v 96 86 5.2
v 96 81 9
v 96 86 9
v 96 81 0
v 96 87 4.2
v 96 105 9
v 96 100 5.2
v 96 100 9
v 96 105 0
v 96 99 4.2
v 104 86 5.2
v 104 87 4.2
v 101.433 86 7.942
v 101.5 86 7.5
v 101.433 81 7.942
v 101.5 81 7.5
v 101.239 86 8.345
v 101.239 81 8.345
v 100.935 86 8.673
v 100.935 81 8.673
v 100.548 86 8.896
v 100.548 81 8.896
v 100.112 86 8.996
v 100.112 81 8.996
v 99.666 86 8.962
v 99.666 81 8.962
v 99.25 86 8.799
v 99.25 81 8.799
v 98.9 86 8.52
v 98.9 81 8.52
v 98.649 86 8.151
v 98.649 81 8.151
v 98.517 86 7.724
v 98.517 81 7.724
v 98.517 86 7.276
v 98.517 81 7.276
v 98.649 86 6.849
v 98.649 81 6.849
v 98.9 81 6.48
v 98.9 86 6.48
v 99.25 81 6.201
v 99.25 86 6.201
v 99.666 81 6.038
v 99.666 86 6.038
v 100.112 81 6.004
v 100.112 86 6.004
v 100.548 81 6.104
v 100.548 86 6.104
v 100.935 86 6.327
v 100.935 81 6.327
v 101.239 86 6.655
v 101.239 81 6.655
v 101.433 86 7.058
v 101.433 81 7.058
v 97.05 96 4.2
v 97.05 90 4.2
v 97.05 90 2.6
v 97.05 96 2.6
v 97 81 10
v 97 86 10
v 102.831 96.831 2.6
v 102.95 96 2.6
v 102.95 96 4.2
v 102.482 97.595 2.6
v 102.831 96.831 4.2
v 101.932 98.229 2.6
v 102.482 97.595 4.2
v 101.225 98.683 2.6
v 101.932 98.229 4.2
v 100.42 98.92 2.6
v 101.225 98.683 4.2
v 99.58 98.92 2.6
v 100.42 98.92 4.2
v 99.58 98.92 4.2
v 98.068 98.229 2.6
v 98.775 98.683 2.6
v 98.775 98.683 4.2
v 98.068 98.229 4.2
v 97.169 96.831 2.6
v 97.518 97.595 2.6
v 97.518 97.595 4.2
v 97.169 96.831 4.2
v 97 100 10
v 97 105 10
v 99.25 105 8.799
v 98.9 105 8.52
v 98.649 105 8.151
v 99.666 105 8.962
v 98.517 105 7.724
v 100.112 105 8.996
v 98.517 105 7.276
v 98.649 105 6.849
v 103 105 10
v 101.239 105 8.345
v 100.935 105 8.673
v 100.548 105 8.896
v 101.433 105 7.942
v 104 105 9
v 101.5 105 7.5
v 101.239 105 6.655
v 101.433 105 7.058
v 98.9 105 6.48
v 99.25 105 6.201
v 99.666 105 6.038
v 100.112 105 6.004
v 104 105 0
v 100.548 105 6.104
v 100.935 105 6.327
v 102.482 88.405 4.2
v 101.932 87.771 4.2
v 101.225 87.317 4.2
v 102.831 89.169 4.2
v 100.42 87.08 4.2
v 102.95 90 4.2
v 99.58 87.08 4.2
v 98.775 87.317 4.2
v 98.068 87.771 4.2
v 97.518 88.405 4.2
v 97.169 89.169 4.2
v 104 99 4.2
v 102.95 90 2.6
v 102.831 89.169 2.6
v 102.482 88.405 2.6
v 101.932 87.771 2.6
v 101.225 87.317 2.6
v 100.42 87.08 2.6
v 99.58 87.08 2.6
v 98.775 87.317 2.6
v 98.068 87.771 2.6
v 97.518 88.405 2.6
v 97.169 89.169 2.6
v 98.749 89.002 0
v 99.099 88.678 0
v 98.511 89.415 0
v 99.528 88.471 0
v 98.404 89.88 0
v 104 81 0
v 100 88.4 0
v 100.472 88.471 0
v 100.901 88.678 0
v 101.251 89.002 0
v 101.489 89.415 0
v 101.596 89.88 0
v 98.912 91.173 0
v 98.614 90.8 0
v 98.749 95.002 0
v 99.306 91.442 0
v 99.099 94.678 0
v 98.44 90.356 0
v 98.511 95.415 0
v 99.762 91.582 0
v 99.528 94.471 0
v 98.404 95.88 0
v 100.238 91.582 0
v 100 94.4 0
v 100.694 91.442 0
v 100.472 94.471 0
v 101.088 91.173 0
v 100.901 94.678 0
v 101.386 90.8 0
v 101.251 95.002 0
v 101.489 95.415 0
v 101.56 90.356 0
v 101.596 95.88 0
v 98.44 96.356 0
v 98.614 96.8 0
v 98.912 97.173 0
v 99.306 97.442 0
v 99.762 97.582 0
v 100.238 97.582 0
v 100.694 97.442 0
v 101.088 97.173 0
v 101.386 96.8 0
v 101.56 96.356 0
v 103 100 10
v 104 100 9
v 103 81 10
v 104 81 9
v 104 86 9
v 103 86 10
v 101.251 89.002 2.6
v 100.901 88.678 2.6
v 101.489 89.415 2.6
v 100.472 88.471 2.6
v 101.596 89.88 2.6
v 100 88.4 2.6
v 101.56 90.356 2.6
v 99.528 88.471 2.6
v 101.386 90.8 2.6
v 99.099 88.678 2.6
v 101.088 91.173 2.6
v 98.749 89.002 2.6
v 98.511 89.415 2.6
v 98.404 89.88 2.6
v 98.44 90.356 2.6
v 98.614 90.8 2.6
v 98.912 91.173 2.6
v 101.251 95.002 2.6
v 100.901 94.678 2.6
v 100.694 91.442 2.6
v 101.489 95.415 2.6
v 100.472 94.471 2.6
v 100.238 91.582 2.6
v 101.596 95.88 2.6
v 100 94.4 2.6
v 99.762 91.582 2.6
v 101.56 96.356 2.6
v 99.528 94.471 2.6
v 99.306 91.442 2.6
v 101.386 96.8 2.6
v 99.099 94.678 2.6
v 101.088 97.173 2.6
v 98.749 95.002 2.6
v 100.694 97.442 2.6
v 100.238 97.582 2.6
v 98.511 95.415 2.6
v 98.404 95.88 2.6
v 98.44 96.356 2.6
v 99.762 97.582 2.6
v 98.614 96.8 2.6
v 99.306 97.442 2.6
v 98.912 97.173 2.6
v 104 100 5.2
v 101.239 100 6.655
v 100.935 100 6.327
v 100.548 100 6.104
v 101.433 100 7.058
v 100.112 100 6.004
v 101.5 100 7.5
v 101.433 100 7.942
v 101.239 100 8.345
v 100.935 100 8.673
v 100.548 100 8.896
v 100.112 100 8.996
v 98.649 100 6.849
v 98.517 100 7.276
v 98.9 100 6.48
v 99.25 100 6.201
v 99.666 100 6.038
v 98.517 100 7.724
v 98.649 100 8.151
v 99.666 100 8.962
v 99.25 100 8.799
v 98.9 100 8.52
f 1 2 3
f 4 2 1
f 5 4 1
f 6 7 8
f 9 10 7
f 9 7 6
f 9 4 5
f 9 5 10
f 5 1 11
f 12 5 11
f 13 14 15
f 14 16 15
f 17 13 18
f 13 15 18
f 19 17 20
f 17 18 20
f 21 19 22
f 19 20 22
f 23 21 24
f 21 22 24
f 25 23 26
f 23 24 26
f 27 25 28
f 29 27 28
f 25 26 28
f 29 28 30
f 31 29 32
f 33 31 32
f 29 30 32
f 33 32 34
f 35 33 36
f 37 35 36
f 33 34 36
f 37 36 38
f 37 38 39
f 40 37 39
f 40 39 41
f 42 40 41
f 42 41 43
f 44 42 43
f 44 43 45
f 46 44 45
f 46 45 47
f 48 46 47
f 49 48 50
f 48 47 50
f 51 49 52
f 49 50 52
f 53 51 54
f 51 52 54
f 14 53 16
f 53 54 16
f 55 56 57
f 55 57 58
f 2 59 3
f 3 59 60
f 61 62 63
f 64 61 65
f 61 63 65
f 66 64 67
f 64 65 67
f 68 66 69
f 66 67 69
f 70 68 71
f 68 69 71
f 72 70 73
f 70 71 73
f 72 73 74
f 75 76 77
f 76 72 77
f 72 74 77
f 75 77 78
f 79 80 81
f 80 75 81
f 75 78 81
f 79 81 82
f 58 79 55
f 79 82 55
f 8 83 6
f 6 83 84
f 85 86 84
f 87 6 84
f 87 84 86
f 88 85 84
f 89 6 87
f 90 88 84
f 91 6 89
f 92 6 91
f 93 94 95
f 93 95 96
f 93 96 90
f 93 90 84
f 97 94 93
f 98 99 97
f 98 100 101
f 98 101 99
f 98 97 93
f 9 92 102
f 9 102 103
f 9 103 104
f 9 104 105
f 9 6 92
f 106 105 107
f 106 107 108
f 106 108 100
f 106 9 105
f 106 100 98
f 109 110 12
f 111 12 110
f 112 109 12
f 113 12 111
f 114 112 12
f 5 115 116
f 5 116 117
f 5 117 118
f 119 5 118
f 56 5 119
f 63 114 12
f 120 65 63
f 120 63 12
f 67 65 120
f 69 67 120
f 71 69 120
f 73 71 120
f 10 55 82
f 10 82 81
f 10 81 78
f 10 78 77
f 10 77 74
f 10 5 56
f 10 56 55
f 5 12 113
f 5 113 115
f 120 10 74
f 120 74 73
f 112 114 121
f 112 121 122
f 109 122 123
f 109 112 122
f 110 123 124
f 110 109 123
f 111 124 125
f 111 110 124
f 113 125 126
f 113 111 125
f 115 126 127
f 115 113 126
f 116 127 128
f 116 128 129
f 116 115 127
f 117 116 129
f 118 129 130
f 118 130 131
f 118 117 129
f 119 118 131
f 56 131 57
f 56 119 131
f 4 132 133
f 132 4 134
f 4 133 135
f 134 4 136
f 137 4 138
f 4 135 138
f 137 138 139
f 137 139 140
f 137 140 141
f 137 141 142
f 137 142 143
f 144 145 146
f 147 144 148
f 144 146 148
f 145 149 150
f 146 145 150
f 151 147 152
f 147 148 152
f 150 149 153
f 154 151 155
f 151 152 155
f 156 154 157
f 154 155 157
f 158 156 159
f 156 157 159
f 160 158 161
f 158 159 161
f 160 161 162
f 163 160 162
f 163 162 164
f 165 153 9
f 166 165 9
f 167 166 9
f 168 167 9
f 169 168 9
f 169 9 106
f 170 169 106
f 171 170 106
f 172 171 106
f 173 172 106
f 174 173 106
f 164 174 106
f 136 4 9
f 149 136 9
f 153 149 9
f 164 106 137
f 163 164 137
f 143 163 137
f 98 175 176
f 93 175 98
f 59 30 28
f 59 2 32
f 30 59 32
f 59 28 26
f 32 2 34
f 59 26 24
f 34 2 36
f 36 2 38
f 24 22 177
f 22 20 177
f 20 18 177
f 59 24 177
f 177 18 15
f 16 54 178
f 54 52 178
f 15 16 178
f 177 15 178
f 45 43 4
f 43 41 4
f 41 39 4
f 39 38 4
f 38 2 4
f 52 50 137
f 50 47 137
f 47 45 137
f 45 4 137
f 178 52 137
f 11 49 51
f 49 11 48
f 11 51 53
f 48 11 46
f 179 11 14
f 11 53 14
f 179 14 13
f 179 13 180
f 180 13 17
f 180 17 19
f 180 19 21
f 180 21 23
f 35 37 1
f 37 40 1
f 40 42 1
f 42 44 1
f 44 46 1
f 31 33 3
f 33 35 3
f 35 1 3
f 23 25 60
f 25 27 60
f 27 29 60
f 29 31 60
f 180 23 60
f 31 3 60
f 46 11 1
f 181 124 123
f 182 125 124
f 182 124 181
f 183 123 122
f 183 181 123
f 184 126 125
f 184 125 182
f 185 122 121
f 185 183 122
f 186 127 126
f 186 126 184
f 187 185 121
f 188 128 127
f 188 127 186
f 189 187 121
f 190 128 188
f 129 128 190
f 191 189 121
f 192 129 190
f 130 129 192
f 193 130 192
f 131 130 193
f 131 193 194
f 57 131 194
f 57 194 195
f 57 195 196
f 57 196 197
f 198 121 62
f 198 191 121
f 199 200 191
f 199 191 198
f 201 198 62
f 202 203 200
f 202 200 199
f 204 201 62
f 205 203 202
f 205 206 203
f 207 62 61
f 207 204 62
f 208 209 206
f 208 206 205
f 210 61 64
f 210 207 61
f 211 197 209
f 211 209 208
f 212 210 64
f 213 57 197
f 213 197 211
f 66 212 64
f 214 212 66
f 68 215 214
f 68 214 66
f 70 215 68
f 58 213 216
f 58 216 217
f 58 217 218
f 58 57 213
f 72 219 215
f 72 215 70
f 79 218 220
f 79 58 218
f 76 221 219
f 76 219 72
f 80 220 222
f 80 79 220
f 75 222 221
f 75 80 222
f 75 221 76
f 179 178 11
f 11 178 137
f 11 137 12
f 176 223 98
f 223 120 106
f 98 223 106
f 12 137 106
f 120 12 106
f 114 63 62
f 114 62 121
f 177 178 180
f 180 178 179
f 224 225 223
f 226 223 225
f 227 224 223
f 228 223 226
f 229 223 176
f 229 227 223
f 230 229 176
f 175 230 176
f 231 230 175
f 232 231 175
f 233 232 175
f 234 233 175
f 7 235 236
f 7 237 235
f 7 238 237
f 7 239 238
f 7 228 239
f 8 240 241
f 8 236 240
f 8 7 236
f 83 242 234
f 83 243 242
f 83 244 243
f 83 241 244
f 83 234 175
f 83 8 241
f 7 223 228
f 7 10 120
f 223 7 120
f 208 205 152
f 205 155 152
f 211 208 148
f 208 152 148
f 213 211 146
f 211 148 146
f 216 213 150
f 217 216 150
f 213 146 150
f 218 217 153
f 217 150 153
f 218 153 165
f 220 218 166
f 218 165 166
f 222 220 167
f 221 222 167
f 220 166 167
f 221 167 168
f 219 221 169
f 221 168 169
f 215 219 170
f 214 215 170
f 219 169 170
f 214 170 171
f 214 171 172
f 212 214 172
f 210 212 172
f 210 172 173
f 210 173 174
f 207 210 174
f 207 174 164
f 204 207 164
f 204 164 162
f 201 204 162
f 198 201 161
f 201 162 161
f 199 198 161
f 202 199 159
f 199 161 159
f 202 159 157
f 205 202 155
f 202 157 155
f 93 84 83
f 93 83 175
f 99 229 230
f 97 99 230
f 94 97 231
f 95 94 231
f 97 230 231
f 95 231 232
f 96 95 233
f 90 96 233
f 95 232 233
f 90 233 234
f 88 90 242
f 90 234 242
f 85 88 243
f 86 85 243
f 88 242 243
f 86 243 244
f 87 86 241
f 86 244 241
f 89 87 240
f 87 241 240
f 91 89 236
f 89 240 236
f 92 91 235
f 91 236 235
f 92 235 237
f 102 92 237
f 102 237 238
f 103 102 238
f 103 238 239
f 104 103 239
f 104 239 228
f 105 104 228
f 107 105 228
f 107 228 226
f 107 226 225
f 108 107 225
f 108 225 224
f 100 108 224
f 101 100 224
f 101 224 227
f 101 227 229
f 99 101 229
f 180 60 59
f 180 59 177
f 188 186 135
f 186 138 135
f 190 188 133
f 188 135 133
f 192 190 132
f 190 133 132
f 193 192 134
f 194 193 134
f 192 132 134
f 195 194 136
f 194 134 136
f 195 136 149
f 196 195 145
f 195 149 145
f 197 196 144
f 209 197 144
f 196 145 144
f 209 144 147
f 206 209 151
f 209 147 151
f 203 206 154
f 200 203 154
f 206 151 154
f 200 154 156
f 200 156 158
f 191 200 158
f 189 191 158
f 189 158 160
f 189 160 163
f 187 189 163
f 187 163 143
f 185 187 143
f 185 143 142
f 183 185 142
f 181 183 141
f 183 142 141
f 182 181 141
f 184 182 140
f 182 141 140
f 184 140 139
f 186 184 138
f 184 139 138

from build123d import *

# Parameters (mm, degrees)
SKETCH_2_W                   = 8
SKETCH_2_H                   = 24
EXTRUDE_1_DEPTH              = 10
SKETCH_3_W                   = 9.180468112
SKETCH_3_H                   = 14
CUT_EXTRUDE_1_DEPTH          = 40
CHAMFER_1_SIZE               = 1
HOLE_WIZARD_M3_1_D           = 3.2
HOLE_WIZARD_M3_1_CBORE_D     = 5.9
HOLE_WIZARD_M3_1_CBORE_DEPTH = 1.6
CUT_EXTRUDE_2_DEPTH          = 1.6
MM_2_D                       = 3
MM_2_DEPTH                   = 24
MM_2_TIP                     = 0.901290929
CHAMFER_2_SIZE               = 1


with BuildPart() as part:
    # 草图2 → 凸台-拉伸1 (new body)
    with BuildSketch(Plane.XY):
        with Locations((100, 93)):
            Rectangle(SKETCH_2_W, SKETCH_2_H)
    extrude(amount=EXTRUDE_1_DEPTH)

    # 草图3 → 切除-拉伸1 (cut)
    with BuildSketch(Plane.ZY.offset(-96)):
        with Locations((8.790234056, 93)):
            Rectangle(SKETCH_3_W, SKETCH_3_H)
    extrude(amount=-CUT_EXTRUDE_1_DEPTH, mode=Mode.SUBTRACT)

    # 倒角1
    chamfer_1_edges = [part.edges().sort_by_distance(p)[0] for p in [
        (100, 86, 4.2),
        (100, 100, 4.2),
    ]]
    chamfer(chamfer_1_edges, length=CHAMFER_1_SIZE)

    # M3 六角头螺栓的柱形沉头孔1 (through all)
    with Locations(Plane(origin=(124.363861944, -131.010130877, 4.2), x_dir=(0, 1, 0), z_dir=(0, 0, 1))):
        with Locations((221.010130877, 24.363861944), (227.010130877, 24.363861944)):
            CounterBoreHole(HOLE_WIZARD_M3_1_D / 2, HOLE_WIZARD_M3_1_CBORE_D / 2, HOLE_WIZARD_M3_1_CBORE_DEPTH)

    # 草图11 → 切除-拉伸2 (cut)
    with BuildSketch(Plane.XY.offset(4.2)):
        with BuildLine():
            Line((97.05, 90), (97.05, 96))
            ThreePointArc((97.05, 96), (100, 98.95), (102.95, 96))
            Line((102.95, 96), (102.95, 90))
            ThreePointArc((102.95, 90), (100, 87.05), (97.05, 90))
        make_face()
    extrude(amount=-CUT_EXTRUDE_2_DEPTH, mode=Mode.SUBTRACT)

    # 大小mm 暗销孔2
    with Locations(Plane(origin=(124.363861944, 105, -5), x_dir=(-1, 0, 0), z_dir=(0, 1, 0))):
        with Locations((24.363861944, 12.5)):
            Hole(MM_2_D / 2, depth=MM_2_DEPTH)
            with Locations((0, 0, -(MM_2_DEPTH + MM_2_TIP / 2))):  # 118° drill point
                Cone(0, MM_2_D / 2, MM_2_TIP, mode=Mode.SUBTRACT)

    # 倒角2
    chamfer_2_edges = [part.edges().sort_by_distance(p)[0] for p in [
        (96, 102.5, 10),
        (104, 102.5, 10),
        (96, 83.5, 10),
        (104, 83.5, 10),
    ]]
    chamfer(chamfer_2_edges, length=CHAMFER_2_SIZE)


solid = part.part
